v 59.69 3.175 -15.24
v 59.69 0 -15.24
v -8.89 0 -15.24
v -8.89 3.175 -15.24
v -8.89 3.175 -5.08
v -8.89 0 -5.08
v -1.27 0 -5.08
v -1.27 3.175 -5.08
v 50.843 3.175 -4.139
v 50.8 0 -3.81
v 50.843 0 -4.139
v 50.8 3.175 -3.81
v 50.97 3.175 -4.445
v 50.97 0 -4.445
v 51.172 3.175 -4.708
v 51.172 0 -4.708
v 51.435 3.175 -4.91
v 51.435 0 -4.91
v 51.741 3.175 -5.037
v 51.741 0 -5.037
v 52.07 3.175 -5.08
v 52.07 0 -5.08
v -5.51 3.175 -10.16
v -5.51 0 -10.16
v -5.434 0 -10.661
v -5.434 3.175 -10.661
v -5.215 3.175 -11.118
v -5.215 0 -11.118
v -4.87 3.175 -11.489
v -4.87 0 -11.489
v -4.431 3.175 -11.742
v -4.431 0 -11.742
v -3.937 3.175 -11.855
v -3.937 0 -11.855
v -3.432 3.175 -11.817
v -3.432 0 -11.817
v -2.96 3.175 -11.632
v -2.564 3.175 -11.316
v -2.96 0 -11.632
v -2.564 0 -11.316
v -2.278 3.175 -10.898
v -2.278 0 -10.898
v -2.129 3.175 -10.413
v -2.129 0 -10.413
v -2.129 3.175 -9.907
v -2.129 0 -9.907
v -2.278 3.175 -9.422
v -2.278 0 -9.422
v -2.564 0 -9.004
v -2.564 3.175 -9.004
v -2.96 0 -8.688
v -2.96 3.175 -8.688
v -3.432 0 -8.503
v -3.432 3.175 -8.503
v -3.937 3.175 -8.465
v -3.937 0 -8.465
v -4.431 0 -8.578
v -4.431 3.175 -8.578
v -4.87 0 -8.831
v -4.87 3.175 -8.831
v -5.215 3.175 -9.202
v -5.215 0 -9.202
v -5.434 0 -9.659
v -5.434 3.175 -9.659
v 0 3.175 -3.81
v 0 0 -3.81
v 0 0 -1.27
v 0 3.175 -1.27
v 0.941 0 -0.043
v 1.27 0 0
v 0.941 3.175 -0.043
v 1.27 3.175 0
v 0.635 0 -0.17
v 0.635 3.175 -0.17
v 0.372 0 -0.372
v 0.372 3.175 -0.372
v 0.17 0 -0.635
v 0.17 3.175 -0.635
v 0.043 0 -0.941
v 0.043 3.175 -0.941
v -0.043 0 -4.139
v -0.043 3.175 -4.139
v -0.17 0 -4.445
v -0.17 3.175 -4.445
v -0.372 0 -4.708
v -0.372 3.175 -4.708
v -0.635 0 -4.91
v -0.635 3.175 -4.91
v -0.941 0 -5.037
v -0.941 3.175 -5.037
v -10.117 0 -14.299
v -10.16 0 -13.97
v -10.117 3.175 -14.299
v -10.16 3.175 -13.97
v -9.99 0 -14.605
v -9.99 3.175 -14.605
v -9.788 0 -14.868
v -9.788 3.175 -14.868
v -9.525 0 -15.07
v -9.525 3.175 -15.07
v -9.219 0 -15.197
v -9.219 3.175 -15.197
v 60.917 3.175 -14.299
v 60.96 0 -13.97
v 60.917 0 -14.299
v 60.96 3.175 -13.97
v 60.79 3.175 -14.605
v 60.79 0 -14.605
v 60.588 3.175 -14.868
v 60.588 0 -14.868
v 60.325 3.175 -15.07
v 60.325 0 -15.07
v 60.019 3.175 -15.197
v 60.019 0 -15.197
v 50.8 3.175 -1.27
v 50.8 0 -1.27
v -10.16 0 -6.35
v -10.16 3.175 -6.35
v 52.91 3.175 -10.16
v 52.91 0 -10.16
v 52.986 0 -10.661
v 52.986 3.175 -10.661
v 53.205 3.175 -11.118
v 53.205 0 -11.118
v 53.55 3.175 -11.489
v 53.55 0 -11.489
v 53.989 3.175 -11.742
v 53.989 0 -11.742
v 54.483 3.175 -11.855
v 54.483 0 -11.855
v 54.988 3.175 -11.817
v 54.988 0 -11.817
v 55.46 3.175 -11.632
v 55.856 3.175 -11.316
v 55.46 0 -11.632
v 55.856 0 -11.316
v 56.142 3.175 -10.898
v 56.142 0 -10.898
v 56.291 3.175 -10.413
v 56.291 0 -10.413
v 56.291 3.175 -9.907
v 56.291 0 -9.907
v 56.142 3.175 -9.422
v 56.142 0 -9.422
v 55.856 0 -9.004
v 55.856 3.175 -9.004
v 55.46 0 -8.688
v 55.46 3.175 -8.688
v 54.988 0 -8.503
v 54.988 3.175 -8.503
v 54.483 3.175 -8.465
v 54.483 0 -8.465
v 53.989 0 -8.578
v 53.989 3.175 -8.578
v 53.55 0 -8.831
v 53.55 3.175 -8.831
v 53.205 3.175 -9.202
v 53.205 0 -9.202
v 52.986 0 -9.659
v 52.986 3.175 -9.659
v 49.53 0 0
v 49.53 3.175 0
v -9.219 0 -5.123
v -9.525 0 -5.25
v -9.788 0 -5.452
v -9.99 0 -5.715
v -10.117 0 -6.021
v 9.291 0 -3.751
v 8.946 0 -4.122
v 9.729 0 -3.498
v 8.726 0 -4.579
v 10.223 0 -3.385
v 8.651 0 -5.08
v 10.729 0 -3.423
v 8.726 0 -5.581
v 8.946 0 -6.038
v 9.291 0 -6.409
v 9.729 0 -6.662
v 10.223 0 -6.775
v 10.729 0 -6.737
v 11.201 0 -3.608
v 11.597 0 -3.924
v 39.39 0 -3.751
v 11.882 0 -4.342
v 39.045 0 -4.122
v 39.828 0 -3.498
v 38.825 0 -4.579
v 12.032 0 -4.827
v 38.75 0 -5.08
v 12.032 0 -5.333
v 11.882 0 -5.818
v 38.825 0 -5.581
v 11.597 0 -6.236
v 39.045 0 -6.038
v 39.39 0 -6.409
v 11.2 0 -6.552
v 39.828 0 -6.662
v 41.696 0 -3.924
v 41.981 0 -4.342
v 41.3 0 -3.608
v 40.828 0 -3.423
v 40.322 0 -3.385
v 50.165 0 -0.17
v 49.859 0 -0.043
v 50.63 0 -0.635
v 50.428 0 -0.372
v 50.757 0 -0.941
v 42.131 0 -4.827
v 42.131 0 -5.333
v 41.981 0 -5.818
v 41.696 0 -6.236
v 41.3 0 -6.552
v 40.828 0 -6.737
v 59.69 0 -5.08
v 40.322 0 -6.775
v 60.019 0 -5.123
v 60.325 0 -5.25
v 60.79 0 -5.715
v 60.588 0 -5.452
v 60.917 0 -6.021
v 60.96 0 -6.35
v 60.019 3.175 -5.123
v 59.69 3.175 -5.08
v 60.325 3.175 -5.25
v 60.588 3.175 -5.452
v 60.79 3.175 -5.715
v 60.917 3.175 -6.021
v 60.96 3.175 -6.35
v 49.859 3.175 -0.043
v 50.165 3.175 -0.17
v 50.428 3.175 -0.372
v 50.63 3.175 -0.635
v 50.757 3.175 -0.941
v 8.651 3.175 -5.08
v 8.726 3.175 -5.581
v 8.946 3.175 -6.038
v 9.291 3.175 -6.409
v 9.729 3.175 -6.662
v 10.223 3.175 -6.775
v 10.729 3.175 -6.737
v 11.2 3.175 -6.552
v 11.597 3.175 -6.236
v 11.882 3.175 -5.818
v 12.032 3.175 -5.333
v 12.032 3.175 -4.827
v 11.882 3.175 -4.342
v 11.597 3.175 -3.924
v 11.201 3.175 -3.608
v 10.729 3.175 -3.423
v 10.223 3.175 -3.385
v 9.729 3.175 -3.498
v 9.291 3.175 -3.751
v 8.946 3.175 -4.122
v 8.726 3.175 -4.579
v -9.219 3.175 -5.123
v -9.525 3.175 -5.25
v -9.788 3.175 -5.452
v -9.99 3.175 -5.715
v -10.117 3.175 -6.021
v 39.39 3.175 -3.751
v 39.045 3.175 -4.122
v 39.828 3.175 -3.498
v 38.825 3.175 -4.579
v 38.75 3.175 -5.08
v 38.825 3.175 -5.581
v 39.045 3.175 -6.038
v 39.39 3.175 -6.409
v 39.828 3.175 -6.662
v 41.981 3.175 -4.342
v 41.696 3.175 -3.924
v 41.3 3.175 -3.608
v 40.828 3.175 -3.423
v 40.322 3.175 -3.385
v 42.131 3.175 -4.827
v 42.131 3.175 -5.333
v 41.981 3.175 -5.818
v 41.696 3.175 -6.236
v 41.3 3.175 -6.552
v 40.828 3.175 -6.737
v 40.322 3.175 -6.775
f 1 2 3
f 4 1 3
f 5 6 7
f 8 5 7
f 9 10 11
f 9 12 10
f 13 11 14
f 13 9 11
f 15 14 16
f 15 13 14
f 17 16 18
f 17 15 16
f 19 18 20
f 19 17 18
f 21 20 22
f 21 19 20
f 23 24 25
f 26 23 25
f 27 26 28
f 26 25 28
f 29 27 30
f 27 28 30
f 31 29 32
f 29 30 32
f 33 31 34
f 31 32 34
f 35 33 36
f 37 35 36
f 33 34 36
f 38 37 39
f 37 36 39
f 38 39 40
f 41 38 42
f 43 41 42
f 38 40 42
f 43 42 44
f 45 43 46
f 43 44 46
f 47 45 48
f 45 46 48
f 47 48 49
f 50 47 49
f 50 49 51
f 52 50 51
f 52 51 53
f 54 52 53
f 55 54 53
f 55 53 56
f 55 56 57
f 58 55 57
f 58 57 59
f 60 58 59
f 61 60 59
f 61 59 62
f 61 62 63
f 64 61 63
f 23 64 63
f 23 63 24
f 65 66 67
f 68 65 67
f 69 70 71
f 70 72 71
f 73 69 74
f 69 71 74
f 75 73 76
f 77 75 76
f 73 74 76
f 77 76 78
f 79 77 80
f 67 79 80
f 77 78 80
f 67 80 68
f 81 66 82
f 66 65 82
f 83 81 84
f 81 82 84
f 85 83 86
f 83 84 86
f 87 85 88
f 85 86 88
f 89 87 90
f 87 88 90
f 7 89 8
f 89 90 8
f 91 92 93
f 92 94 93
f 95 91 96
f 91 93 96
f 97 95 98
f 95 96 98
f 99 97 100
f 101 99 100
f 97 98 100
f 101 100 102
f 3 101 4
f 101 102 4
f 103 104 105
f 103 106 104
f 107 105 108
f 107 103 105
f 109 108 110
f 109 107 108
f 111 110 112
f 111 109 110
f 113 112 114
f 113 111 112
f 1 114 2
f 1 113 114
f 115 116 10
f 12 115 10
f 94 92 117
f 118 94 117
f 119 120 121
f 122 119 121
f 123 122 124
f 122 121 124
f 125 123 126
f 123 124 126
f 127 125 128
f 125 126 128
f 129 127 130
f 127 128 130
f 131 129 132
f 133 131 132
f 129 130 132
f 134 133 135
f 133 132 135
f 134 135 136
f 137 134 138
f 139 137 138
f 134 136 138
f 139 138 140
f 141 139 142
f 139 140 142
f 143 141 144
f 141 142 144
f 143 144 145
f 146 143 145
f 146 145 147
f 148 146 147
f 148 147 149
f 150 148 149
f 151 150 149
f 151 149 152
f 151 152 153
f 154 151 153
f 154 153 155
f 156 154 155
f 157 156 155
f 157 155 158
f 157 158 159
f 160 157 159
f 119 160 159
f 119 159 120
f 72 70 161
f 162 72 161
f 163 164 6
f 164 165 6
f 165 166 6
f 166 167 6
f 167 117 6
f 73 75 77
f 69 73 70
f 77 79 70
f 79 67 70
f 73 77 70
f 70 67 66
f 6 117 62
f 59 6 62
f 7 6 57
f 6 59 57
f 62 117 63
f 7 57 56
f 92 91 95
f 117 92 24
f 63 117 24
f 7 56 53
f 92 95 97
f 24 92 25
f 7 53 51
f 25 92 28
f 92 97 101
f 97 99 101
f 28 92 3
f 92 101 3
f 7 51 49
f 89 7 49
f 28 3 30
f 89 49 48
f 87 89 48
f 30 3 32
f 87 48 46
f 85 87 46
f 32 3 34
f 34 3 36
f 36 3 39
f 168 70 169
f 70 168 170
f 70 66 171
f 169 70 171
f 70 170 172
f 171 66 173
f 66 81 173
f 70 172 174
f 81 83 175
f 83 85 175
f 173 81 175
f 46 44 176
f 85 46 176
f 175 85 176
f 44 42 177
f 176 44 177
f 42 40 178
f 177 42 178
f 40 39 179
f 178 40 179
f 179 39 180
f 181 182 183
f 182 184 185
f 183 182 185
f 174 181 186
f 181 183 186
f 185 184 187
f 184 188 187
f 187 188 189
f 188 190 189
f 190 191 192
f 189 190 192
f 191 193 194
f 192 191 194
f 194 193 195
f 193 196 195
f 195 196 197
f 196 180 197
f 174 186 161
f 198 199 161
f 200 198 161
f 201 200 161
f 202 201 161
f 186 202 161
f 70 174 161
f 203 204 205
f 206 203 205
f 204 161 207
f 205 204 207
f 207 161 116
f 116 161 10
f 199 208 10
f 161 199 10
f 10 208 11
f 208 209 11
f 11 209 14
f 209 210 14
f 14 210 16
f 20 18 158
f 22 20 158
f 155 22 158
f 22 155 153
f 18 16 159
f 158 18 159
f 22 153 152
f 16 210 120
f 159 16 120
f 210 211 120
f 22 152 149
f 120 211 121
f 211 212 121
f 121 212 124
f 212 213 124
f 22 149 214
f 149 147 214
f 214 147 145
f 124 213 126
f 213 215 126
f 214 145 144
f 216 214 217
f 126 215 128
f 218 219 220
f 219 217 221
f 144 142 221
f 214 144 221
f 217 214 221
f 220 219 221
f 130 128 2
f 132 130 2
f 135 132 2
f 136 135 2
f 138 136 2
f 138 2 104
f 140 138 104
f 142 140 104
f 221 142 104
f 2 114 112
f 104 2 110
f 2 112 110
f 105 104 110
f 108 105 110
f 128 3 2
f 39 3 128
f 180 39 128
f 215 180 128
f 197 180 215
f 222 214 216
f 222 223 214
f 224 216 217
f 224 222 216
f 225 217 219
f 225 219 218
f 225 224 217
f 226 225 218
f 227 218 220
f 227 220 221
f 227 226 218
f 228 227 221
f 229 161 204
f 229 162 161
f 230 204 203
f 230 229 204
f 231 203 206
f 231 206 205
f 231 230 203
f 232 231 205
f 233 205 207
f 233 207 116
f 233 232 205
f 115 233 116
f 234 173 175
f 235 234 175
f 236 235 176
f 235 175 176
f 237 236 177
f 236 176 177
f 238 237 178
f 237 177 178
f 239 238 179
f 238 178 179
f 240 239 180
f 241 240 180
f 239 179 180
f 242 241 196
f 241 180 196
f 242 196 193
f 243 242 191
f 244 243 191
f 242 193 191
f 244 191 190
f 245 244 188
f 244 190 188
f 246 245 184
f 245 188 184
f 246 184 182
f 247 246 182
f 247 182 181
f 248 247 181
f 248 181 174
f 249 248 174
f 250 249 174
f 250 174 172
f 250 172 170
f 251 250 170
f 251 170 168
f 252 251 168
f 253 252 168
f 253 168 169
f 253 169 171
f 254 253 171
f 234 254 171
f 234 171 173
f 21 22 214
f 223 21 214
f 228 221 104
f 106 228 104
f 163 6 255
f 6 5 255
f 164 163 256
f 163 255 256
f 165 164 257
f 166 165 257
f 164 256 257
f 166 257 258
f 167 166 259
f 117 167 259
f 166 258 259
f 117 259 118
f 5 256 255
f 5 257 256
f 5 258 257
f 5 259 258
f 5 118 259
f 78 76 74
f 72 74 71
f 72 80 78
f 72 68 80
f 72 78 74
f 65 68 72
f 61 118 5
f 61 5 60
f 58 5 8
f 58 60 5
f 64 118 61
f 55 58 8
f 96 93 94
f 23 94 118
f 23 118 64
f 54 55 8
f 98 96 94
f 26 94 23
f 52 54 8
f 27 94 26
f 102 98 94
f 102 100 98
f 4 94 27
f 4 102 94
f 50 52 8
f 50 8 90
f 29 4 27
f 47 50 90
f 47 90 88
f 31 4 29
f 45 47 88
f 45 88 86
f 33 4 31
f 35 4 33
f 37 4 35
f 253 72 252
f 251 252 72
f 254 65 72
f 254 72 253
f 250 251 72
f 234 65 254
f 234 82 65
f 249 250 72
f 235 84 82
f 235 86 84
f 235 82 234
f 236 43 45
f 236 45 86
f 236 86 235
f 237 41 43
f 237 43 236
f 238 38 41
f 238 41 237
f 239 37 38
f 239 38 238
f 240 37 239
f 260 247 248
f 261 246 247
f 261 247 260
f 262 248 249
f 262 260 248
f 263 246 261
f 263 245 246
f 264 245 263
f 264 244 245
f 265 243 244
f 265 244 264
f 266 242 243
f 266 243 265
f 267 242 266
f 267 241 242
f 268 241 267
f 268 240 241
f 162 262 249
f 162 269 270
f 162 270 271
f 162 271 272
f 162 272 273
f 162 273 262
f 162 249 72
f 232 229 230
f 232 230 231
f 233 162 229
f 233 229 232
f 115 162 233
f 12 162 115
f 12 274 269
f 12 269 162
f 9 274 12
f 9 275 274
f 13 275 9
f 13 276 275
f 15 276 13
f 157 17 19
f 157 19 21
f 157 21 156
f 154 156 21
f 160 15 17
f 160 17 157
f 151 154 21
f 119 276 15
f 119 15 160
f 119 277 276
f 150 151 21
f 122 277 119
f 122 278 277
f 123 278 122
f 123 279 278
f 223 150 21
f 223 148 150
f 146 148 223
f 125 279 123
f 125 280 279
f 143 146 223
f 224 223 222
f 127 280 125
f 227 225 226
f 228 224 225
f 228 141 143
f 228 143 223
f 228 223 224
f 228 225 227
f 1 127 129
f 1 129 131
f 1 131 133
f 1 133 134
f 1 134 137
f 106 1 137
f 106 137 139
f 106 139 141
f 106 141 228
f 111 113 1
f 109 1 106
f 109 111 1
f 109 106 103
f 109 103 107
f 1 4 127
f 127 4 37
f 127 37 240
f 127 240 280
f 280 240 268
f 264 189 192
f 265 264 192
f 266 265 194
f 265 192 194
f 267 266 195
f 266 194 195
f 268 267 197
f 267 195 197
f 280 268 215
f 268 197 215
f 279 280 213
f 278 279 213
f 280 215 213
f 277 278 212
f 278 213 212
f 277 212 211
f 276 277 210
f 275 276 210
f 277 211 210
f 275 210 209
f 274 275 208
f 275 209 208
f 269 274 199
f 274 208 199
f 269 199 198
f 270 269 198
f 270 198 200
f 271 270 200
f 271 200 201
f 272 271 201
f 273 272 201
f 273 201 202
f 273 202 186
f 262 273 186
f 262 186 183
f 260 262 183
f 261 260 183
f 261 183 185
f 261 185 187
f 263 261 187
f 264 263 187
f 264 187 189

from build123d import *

# Parameters (mm, degrees)
BOSS_EXTRUDE1_DEPTH  = 3.175
M3_CLEARANCE_HOLE2_D = 3.4
FILLET1_R            = 1.27


with BuildPart() as part:
    # Sketch1 → Boss-Extrude1 (new body)
    with BuildSketch(Plane(origin=(0, 0, 0), x_dir=(1, 0, 0), z_dir=(0, 1, 0))):
        Polygon((0, 0), (50.8, 0), (50.8, 5.08), (60.96, 5.08), (60.96, 15.24), (-10.16, 15.24), (-10.16, 5.08), (0, 5.08), align=None)
    extrude(amount=BOSS_EXTRUDE1_DEPTH)

    # M3 Clearance Hole2 (through all)
    with Locations(Plane(origin=(0, 3.175, 0), x_dir=(1, 0, 0), z_dir=(0, 1, 0))):
        with Locations((-3.81, 10.16), (10.3505, 5.08), (40.4495, 5.08), (54.61, 10.16)):
            Hole(M3_CLEARANCE_HOLE2_D / 2)

    # Fillet1
    fillet1_edges = [part.edges().sort_by_distance(p)[0] for p in [
        (0, 1.5875, -5.08),
        (-10.16, 1.5875, -5.08),
        (-10.16, 1.5875, -15.24),
        (60.96, 1.5875, -15.24),
        (60.96, 1.5875, -5.08),
        (50.8, 1.5875, -5.08),
        (50.8, 1.5875, 0),
        (0, 1.5875, 0),
    ]]
    fillet(fillet1_edges, radius=FILLET1_R)


solid = part.part
